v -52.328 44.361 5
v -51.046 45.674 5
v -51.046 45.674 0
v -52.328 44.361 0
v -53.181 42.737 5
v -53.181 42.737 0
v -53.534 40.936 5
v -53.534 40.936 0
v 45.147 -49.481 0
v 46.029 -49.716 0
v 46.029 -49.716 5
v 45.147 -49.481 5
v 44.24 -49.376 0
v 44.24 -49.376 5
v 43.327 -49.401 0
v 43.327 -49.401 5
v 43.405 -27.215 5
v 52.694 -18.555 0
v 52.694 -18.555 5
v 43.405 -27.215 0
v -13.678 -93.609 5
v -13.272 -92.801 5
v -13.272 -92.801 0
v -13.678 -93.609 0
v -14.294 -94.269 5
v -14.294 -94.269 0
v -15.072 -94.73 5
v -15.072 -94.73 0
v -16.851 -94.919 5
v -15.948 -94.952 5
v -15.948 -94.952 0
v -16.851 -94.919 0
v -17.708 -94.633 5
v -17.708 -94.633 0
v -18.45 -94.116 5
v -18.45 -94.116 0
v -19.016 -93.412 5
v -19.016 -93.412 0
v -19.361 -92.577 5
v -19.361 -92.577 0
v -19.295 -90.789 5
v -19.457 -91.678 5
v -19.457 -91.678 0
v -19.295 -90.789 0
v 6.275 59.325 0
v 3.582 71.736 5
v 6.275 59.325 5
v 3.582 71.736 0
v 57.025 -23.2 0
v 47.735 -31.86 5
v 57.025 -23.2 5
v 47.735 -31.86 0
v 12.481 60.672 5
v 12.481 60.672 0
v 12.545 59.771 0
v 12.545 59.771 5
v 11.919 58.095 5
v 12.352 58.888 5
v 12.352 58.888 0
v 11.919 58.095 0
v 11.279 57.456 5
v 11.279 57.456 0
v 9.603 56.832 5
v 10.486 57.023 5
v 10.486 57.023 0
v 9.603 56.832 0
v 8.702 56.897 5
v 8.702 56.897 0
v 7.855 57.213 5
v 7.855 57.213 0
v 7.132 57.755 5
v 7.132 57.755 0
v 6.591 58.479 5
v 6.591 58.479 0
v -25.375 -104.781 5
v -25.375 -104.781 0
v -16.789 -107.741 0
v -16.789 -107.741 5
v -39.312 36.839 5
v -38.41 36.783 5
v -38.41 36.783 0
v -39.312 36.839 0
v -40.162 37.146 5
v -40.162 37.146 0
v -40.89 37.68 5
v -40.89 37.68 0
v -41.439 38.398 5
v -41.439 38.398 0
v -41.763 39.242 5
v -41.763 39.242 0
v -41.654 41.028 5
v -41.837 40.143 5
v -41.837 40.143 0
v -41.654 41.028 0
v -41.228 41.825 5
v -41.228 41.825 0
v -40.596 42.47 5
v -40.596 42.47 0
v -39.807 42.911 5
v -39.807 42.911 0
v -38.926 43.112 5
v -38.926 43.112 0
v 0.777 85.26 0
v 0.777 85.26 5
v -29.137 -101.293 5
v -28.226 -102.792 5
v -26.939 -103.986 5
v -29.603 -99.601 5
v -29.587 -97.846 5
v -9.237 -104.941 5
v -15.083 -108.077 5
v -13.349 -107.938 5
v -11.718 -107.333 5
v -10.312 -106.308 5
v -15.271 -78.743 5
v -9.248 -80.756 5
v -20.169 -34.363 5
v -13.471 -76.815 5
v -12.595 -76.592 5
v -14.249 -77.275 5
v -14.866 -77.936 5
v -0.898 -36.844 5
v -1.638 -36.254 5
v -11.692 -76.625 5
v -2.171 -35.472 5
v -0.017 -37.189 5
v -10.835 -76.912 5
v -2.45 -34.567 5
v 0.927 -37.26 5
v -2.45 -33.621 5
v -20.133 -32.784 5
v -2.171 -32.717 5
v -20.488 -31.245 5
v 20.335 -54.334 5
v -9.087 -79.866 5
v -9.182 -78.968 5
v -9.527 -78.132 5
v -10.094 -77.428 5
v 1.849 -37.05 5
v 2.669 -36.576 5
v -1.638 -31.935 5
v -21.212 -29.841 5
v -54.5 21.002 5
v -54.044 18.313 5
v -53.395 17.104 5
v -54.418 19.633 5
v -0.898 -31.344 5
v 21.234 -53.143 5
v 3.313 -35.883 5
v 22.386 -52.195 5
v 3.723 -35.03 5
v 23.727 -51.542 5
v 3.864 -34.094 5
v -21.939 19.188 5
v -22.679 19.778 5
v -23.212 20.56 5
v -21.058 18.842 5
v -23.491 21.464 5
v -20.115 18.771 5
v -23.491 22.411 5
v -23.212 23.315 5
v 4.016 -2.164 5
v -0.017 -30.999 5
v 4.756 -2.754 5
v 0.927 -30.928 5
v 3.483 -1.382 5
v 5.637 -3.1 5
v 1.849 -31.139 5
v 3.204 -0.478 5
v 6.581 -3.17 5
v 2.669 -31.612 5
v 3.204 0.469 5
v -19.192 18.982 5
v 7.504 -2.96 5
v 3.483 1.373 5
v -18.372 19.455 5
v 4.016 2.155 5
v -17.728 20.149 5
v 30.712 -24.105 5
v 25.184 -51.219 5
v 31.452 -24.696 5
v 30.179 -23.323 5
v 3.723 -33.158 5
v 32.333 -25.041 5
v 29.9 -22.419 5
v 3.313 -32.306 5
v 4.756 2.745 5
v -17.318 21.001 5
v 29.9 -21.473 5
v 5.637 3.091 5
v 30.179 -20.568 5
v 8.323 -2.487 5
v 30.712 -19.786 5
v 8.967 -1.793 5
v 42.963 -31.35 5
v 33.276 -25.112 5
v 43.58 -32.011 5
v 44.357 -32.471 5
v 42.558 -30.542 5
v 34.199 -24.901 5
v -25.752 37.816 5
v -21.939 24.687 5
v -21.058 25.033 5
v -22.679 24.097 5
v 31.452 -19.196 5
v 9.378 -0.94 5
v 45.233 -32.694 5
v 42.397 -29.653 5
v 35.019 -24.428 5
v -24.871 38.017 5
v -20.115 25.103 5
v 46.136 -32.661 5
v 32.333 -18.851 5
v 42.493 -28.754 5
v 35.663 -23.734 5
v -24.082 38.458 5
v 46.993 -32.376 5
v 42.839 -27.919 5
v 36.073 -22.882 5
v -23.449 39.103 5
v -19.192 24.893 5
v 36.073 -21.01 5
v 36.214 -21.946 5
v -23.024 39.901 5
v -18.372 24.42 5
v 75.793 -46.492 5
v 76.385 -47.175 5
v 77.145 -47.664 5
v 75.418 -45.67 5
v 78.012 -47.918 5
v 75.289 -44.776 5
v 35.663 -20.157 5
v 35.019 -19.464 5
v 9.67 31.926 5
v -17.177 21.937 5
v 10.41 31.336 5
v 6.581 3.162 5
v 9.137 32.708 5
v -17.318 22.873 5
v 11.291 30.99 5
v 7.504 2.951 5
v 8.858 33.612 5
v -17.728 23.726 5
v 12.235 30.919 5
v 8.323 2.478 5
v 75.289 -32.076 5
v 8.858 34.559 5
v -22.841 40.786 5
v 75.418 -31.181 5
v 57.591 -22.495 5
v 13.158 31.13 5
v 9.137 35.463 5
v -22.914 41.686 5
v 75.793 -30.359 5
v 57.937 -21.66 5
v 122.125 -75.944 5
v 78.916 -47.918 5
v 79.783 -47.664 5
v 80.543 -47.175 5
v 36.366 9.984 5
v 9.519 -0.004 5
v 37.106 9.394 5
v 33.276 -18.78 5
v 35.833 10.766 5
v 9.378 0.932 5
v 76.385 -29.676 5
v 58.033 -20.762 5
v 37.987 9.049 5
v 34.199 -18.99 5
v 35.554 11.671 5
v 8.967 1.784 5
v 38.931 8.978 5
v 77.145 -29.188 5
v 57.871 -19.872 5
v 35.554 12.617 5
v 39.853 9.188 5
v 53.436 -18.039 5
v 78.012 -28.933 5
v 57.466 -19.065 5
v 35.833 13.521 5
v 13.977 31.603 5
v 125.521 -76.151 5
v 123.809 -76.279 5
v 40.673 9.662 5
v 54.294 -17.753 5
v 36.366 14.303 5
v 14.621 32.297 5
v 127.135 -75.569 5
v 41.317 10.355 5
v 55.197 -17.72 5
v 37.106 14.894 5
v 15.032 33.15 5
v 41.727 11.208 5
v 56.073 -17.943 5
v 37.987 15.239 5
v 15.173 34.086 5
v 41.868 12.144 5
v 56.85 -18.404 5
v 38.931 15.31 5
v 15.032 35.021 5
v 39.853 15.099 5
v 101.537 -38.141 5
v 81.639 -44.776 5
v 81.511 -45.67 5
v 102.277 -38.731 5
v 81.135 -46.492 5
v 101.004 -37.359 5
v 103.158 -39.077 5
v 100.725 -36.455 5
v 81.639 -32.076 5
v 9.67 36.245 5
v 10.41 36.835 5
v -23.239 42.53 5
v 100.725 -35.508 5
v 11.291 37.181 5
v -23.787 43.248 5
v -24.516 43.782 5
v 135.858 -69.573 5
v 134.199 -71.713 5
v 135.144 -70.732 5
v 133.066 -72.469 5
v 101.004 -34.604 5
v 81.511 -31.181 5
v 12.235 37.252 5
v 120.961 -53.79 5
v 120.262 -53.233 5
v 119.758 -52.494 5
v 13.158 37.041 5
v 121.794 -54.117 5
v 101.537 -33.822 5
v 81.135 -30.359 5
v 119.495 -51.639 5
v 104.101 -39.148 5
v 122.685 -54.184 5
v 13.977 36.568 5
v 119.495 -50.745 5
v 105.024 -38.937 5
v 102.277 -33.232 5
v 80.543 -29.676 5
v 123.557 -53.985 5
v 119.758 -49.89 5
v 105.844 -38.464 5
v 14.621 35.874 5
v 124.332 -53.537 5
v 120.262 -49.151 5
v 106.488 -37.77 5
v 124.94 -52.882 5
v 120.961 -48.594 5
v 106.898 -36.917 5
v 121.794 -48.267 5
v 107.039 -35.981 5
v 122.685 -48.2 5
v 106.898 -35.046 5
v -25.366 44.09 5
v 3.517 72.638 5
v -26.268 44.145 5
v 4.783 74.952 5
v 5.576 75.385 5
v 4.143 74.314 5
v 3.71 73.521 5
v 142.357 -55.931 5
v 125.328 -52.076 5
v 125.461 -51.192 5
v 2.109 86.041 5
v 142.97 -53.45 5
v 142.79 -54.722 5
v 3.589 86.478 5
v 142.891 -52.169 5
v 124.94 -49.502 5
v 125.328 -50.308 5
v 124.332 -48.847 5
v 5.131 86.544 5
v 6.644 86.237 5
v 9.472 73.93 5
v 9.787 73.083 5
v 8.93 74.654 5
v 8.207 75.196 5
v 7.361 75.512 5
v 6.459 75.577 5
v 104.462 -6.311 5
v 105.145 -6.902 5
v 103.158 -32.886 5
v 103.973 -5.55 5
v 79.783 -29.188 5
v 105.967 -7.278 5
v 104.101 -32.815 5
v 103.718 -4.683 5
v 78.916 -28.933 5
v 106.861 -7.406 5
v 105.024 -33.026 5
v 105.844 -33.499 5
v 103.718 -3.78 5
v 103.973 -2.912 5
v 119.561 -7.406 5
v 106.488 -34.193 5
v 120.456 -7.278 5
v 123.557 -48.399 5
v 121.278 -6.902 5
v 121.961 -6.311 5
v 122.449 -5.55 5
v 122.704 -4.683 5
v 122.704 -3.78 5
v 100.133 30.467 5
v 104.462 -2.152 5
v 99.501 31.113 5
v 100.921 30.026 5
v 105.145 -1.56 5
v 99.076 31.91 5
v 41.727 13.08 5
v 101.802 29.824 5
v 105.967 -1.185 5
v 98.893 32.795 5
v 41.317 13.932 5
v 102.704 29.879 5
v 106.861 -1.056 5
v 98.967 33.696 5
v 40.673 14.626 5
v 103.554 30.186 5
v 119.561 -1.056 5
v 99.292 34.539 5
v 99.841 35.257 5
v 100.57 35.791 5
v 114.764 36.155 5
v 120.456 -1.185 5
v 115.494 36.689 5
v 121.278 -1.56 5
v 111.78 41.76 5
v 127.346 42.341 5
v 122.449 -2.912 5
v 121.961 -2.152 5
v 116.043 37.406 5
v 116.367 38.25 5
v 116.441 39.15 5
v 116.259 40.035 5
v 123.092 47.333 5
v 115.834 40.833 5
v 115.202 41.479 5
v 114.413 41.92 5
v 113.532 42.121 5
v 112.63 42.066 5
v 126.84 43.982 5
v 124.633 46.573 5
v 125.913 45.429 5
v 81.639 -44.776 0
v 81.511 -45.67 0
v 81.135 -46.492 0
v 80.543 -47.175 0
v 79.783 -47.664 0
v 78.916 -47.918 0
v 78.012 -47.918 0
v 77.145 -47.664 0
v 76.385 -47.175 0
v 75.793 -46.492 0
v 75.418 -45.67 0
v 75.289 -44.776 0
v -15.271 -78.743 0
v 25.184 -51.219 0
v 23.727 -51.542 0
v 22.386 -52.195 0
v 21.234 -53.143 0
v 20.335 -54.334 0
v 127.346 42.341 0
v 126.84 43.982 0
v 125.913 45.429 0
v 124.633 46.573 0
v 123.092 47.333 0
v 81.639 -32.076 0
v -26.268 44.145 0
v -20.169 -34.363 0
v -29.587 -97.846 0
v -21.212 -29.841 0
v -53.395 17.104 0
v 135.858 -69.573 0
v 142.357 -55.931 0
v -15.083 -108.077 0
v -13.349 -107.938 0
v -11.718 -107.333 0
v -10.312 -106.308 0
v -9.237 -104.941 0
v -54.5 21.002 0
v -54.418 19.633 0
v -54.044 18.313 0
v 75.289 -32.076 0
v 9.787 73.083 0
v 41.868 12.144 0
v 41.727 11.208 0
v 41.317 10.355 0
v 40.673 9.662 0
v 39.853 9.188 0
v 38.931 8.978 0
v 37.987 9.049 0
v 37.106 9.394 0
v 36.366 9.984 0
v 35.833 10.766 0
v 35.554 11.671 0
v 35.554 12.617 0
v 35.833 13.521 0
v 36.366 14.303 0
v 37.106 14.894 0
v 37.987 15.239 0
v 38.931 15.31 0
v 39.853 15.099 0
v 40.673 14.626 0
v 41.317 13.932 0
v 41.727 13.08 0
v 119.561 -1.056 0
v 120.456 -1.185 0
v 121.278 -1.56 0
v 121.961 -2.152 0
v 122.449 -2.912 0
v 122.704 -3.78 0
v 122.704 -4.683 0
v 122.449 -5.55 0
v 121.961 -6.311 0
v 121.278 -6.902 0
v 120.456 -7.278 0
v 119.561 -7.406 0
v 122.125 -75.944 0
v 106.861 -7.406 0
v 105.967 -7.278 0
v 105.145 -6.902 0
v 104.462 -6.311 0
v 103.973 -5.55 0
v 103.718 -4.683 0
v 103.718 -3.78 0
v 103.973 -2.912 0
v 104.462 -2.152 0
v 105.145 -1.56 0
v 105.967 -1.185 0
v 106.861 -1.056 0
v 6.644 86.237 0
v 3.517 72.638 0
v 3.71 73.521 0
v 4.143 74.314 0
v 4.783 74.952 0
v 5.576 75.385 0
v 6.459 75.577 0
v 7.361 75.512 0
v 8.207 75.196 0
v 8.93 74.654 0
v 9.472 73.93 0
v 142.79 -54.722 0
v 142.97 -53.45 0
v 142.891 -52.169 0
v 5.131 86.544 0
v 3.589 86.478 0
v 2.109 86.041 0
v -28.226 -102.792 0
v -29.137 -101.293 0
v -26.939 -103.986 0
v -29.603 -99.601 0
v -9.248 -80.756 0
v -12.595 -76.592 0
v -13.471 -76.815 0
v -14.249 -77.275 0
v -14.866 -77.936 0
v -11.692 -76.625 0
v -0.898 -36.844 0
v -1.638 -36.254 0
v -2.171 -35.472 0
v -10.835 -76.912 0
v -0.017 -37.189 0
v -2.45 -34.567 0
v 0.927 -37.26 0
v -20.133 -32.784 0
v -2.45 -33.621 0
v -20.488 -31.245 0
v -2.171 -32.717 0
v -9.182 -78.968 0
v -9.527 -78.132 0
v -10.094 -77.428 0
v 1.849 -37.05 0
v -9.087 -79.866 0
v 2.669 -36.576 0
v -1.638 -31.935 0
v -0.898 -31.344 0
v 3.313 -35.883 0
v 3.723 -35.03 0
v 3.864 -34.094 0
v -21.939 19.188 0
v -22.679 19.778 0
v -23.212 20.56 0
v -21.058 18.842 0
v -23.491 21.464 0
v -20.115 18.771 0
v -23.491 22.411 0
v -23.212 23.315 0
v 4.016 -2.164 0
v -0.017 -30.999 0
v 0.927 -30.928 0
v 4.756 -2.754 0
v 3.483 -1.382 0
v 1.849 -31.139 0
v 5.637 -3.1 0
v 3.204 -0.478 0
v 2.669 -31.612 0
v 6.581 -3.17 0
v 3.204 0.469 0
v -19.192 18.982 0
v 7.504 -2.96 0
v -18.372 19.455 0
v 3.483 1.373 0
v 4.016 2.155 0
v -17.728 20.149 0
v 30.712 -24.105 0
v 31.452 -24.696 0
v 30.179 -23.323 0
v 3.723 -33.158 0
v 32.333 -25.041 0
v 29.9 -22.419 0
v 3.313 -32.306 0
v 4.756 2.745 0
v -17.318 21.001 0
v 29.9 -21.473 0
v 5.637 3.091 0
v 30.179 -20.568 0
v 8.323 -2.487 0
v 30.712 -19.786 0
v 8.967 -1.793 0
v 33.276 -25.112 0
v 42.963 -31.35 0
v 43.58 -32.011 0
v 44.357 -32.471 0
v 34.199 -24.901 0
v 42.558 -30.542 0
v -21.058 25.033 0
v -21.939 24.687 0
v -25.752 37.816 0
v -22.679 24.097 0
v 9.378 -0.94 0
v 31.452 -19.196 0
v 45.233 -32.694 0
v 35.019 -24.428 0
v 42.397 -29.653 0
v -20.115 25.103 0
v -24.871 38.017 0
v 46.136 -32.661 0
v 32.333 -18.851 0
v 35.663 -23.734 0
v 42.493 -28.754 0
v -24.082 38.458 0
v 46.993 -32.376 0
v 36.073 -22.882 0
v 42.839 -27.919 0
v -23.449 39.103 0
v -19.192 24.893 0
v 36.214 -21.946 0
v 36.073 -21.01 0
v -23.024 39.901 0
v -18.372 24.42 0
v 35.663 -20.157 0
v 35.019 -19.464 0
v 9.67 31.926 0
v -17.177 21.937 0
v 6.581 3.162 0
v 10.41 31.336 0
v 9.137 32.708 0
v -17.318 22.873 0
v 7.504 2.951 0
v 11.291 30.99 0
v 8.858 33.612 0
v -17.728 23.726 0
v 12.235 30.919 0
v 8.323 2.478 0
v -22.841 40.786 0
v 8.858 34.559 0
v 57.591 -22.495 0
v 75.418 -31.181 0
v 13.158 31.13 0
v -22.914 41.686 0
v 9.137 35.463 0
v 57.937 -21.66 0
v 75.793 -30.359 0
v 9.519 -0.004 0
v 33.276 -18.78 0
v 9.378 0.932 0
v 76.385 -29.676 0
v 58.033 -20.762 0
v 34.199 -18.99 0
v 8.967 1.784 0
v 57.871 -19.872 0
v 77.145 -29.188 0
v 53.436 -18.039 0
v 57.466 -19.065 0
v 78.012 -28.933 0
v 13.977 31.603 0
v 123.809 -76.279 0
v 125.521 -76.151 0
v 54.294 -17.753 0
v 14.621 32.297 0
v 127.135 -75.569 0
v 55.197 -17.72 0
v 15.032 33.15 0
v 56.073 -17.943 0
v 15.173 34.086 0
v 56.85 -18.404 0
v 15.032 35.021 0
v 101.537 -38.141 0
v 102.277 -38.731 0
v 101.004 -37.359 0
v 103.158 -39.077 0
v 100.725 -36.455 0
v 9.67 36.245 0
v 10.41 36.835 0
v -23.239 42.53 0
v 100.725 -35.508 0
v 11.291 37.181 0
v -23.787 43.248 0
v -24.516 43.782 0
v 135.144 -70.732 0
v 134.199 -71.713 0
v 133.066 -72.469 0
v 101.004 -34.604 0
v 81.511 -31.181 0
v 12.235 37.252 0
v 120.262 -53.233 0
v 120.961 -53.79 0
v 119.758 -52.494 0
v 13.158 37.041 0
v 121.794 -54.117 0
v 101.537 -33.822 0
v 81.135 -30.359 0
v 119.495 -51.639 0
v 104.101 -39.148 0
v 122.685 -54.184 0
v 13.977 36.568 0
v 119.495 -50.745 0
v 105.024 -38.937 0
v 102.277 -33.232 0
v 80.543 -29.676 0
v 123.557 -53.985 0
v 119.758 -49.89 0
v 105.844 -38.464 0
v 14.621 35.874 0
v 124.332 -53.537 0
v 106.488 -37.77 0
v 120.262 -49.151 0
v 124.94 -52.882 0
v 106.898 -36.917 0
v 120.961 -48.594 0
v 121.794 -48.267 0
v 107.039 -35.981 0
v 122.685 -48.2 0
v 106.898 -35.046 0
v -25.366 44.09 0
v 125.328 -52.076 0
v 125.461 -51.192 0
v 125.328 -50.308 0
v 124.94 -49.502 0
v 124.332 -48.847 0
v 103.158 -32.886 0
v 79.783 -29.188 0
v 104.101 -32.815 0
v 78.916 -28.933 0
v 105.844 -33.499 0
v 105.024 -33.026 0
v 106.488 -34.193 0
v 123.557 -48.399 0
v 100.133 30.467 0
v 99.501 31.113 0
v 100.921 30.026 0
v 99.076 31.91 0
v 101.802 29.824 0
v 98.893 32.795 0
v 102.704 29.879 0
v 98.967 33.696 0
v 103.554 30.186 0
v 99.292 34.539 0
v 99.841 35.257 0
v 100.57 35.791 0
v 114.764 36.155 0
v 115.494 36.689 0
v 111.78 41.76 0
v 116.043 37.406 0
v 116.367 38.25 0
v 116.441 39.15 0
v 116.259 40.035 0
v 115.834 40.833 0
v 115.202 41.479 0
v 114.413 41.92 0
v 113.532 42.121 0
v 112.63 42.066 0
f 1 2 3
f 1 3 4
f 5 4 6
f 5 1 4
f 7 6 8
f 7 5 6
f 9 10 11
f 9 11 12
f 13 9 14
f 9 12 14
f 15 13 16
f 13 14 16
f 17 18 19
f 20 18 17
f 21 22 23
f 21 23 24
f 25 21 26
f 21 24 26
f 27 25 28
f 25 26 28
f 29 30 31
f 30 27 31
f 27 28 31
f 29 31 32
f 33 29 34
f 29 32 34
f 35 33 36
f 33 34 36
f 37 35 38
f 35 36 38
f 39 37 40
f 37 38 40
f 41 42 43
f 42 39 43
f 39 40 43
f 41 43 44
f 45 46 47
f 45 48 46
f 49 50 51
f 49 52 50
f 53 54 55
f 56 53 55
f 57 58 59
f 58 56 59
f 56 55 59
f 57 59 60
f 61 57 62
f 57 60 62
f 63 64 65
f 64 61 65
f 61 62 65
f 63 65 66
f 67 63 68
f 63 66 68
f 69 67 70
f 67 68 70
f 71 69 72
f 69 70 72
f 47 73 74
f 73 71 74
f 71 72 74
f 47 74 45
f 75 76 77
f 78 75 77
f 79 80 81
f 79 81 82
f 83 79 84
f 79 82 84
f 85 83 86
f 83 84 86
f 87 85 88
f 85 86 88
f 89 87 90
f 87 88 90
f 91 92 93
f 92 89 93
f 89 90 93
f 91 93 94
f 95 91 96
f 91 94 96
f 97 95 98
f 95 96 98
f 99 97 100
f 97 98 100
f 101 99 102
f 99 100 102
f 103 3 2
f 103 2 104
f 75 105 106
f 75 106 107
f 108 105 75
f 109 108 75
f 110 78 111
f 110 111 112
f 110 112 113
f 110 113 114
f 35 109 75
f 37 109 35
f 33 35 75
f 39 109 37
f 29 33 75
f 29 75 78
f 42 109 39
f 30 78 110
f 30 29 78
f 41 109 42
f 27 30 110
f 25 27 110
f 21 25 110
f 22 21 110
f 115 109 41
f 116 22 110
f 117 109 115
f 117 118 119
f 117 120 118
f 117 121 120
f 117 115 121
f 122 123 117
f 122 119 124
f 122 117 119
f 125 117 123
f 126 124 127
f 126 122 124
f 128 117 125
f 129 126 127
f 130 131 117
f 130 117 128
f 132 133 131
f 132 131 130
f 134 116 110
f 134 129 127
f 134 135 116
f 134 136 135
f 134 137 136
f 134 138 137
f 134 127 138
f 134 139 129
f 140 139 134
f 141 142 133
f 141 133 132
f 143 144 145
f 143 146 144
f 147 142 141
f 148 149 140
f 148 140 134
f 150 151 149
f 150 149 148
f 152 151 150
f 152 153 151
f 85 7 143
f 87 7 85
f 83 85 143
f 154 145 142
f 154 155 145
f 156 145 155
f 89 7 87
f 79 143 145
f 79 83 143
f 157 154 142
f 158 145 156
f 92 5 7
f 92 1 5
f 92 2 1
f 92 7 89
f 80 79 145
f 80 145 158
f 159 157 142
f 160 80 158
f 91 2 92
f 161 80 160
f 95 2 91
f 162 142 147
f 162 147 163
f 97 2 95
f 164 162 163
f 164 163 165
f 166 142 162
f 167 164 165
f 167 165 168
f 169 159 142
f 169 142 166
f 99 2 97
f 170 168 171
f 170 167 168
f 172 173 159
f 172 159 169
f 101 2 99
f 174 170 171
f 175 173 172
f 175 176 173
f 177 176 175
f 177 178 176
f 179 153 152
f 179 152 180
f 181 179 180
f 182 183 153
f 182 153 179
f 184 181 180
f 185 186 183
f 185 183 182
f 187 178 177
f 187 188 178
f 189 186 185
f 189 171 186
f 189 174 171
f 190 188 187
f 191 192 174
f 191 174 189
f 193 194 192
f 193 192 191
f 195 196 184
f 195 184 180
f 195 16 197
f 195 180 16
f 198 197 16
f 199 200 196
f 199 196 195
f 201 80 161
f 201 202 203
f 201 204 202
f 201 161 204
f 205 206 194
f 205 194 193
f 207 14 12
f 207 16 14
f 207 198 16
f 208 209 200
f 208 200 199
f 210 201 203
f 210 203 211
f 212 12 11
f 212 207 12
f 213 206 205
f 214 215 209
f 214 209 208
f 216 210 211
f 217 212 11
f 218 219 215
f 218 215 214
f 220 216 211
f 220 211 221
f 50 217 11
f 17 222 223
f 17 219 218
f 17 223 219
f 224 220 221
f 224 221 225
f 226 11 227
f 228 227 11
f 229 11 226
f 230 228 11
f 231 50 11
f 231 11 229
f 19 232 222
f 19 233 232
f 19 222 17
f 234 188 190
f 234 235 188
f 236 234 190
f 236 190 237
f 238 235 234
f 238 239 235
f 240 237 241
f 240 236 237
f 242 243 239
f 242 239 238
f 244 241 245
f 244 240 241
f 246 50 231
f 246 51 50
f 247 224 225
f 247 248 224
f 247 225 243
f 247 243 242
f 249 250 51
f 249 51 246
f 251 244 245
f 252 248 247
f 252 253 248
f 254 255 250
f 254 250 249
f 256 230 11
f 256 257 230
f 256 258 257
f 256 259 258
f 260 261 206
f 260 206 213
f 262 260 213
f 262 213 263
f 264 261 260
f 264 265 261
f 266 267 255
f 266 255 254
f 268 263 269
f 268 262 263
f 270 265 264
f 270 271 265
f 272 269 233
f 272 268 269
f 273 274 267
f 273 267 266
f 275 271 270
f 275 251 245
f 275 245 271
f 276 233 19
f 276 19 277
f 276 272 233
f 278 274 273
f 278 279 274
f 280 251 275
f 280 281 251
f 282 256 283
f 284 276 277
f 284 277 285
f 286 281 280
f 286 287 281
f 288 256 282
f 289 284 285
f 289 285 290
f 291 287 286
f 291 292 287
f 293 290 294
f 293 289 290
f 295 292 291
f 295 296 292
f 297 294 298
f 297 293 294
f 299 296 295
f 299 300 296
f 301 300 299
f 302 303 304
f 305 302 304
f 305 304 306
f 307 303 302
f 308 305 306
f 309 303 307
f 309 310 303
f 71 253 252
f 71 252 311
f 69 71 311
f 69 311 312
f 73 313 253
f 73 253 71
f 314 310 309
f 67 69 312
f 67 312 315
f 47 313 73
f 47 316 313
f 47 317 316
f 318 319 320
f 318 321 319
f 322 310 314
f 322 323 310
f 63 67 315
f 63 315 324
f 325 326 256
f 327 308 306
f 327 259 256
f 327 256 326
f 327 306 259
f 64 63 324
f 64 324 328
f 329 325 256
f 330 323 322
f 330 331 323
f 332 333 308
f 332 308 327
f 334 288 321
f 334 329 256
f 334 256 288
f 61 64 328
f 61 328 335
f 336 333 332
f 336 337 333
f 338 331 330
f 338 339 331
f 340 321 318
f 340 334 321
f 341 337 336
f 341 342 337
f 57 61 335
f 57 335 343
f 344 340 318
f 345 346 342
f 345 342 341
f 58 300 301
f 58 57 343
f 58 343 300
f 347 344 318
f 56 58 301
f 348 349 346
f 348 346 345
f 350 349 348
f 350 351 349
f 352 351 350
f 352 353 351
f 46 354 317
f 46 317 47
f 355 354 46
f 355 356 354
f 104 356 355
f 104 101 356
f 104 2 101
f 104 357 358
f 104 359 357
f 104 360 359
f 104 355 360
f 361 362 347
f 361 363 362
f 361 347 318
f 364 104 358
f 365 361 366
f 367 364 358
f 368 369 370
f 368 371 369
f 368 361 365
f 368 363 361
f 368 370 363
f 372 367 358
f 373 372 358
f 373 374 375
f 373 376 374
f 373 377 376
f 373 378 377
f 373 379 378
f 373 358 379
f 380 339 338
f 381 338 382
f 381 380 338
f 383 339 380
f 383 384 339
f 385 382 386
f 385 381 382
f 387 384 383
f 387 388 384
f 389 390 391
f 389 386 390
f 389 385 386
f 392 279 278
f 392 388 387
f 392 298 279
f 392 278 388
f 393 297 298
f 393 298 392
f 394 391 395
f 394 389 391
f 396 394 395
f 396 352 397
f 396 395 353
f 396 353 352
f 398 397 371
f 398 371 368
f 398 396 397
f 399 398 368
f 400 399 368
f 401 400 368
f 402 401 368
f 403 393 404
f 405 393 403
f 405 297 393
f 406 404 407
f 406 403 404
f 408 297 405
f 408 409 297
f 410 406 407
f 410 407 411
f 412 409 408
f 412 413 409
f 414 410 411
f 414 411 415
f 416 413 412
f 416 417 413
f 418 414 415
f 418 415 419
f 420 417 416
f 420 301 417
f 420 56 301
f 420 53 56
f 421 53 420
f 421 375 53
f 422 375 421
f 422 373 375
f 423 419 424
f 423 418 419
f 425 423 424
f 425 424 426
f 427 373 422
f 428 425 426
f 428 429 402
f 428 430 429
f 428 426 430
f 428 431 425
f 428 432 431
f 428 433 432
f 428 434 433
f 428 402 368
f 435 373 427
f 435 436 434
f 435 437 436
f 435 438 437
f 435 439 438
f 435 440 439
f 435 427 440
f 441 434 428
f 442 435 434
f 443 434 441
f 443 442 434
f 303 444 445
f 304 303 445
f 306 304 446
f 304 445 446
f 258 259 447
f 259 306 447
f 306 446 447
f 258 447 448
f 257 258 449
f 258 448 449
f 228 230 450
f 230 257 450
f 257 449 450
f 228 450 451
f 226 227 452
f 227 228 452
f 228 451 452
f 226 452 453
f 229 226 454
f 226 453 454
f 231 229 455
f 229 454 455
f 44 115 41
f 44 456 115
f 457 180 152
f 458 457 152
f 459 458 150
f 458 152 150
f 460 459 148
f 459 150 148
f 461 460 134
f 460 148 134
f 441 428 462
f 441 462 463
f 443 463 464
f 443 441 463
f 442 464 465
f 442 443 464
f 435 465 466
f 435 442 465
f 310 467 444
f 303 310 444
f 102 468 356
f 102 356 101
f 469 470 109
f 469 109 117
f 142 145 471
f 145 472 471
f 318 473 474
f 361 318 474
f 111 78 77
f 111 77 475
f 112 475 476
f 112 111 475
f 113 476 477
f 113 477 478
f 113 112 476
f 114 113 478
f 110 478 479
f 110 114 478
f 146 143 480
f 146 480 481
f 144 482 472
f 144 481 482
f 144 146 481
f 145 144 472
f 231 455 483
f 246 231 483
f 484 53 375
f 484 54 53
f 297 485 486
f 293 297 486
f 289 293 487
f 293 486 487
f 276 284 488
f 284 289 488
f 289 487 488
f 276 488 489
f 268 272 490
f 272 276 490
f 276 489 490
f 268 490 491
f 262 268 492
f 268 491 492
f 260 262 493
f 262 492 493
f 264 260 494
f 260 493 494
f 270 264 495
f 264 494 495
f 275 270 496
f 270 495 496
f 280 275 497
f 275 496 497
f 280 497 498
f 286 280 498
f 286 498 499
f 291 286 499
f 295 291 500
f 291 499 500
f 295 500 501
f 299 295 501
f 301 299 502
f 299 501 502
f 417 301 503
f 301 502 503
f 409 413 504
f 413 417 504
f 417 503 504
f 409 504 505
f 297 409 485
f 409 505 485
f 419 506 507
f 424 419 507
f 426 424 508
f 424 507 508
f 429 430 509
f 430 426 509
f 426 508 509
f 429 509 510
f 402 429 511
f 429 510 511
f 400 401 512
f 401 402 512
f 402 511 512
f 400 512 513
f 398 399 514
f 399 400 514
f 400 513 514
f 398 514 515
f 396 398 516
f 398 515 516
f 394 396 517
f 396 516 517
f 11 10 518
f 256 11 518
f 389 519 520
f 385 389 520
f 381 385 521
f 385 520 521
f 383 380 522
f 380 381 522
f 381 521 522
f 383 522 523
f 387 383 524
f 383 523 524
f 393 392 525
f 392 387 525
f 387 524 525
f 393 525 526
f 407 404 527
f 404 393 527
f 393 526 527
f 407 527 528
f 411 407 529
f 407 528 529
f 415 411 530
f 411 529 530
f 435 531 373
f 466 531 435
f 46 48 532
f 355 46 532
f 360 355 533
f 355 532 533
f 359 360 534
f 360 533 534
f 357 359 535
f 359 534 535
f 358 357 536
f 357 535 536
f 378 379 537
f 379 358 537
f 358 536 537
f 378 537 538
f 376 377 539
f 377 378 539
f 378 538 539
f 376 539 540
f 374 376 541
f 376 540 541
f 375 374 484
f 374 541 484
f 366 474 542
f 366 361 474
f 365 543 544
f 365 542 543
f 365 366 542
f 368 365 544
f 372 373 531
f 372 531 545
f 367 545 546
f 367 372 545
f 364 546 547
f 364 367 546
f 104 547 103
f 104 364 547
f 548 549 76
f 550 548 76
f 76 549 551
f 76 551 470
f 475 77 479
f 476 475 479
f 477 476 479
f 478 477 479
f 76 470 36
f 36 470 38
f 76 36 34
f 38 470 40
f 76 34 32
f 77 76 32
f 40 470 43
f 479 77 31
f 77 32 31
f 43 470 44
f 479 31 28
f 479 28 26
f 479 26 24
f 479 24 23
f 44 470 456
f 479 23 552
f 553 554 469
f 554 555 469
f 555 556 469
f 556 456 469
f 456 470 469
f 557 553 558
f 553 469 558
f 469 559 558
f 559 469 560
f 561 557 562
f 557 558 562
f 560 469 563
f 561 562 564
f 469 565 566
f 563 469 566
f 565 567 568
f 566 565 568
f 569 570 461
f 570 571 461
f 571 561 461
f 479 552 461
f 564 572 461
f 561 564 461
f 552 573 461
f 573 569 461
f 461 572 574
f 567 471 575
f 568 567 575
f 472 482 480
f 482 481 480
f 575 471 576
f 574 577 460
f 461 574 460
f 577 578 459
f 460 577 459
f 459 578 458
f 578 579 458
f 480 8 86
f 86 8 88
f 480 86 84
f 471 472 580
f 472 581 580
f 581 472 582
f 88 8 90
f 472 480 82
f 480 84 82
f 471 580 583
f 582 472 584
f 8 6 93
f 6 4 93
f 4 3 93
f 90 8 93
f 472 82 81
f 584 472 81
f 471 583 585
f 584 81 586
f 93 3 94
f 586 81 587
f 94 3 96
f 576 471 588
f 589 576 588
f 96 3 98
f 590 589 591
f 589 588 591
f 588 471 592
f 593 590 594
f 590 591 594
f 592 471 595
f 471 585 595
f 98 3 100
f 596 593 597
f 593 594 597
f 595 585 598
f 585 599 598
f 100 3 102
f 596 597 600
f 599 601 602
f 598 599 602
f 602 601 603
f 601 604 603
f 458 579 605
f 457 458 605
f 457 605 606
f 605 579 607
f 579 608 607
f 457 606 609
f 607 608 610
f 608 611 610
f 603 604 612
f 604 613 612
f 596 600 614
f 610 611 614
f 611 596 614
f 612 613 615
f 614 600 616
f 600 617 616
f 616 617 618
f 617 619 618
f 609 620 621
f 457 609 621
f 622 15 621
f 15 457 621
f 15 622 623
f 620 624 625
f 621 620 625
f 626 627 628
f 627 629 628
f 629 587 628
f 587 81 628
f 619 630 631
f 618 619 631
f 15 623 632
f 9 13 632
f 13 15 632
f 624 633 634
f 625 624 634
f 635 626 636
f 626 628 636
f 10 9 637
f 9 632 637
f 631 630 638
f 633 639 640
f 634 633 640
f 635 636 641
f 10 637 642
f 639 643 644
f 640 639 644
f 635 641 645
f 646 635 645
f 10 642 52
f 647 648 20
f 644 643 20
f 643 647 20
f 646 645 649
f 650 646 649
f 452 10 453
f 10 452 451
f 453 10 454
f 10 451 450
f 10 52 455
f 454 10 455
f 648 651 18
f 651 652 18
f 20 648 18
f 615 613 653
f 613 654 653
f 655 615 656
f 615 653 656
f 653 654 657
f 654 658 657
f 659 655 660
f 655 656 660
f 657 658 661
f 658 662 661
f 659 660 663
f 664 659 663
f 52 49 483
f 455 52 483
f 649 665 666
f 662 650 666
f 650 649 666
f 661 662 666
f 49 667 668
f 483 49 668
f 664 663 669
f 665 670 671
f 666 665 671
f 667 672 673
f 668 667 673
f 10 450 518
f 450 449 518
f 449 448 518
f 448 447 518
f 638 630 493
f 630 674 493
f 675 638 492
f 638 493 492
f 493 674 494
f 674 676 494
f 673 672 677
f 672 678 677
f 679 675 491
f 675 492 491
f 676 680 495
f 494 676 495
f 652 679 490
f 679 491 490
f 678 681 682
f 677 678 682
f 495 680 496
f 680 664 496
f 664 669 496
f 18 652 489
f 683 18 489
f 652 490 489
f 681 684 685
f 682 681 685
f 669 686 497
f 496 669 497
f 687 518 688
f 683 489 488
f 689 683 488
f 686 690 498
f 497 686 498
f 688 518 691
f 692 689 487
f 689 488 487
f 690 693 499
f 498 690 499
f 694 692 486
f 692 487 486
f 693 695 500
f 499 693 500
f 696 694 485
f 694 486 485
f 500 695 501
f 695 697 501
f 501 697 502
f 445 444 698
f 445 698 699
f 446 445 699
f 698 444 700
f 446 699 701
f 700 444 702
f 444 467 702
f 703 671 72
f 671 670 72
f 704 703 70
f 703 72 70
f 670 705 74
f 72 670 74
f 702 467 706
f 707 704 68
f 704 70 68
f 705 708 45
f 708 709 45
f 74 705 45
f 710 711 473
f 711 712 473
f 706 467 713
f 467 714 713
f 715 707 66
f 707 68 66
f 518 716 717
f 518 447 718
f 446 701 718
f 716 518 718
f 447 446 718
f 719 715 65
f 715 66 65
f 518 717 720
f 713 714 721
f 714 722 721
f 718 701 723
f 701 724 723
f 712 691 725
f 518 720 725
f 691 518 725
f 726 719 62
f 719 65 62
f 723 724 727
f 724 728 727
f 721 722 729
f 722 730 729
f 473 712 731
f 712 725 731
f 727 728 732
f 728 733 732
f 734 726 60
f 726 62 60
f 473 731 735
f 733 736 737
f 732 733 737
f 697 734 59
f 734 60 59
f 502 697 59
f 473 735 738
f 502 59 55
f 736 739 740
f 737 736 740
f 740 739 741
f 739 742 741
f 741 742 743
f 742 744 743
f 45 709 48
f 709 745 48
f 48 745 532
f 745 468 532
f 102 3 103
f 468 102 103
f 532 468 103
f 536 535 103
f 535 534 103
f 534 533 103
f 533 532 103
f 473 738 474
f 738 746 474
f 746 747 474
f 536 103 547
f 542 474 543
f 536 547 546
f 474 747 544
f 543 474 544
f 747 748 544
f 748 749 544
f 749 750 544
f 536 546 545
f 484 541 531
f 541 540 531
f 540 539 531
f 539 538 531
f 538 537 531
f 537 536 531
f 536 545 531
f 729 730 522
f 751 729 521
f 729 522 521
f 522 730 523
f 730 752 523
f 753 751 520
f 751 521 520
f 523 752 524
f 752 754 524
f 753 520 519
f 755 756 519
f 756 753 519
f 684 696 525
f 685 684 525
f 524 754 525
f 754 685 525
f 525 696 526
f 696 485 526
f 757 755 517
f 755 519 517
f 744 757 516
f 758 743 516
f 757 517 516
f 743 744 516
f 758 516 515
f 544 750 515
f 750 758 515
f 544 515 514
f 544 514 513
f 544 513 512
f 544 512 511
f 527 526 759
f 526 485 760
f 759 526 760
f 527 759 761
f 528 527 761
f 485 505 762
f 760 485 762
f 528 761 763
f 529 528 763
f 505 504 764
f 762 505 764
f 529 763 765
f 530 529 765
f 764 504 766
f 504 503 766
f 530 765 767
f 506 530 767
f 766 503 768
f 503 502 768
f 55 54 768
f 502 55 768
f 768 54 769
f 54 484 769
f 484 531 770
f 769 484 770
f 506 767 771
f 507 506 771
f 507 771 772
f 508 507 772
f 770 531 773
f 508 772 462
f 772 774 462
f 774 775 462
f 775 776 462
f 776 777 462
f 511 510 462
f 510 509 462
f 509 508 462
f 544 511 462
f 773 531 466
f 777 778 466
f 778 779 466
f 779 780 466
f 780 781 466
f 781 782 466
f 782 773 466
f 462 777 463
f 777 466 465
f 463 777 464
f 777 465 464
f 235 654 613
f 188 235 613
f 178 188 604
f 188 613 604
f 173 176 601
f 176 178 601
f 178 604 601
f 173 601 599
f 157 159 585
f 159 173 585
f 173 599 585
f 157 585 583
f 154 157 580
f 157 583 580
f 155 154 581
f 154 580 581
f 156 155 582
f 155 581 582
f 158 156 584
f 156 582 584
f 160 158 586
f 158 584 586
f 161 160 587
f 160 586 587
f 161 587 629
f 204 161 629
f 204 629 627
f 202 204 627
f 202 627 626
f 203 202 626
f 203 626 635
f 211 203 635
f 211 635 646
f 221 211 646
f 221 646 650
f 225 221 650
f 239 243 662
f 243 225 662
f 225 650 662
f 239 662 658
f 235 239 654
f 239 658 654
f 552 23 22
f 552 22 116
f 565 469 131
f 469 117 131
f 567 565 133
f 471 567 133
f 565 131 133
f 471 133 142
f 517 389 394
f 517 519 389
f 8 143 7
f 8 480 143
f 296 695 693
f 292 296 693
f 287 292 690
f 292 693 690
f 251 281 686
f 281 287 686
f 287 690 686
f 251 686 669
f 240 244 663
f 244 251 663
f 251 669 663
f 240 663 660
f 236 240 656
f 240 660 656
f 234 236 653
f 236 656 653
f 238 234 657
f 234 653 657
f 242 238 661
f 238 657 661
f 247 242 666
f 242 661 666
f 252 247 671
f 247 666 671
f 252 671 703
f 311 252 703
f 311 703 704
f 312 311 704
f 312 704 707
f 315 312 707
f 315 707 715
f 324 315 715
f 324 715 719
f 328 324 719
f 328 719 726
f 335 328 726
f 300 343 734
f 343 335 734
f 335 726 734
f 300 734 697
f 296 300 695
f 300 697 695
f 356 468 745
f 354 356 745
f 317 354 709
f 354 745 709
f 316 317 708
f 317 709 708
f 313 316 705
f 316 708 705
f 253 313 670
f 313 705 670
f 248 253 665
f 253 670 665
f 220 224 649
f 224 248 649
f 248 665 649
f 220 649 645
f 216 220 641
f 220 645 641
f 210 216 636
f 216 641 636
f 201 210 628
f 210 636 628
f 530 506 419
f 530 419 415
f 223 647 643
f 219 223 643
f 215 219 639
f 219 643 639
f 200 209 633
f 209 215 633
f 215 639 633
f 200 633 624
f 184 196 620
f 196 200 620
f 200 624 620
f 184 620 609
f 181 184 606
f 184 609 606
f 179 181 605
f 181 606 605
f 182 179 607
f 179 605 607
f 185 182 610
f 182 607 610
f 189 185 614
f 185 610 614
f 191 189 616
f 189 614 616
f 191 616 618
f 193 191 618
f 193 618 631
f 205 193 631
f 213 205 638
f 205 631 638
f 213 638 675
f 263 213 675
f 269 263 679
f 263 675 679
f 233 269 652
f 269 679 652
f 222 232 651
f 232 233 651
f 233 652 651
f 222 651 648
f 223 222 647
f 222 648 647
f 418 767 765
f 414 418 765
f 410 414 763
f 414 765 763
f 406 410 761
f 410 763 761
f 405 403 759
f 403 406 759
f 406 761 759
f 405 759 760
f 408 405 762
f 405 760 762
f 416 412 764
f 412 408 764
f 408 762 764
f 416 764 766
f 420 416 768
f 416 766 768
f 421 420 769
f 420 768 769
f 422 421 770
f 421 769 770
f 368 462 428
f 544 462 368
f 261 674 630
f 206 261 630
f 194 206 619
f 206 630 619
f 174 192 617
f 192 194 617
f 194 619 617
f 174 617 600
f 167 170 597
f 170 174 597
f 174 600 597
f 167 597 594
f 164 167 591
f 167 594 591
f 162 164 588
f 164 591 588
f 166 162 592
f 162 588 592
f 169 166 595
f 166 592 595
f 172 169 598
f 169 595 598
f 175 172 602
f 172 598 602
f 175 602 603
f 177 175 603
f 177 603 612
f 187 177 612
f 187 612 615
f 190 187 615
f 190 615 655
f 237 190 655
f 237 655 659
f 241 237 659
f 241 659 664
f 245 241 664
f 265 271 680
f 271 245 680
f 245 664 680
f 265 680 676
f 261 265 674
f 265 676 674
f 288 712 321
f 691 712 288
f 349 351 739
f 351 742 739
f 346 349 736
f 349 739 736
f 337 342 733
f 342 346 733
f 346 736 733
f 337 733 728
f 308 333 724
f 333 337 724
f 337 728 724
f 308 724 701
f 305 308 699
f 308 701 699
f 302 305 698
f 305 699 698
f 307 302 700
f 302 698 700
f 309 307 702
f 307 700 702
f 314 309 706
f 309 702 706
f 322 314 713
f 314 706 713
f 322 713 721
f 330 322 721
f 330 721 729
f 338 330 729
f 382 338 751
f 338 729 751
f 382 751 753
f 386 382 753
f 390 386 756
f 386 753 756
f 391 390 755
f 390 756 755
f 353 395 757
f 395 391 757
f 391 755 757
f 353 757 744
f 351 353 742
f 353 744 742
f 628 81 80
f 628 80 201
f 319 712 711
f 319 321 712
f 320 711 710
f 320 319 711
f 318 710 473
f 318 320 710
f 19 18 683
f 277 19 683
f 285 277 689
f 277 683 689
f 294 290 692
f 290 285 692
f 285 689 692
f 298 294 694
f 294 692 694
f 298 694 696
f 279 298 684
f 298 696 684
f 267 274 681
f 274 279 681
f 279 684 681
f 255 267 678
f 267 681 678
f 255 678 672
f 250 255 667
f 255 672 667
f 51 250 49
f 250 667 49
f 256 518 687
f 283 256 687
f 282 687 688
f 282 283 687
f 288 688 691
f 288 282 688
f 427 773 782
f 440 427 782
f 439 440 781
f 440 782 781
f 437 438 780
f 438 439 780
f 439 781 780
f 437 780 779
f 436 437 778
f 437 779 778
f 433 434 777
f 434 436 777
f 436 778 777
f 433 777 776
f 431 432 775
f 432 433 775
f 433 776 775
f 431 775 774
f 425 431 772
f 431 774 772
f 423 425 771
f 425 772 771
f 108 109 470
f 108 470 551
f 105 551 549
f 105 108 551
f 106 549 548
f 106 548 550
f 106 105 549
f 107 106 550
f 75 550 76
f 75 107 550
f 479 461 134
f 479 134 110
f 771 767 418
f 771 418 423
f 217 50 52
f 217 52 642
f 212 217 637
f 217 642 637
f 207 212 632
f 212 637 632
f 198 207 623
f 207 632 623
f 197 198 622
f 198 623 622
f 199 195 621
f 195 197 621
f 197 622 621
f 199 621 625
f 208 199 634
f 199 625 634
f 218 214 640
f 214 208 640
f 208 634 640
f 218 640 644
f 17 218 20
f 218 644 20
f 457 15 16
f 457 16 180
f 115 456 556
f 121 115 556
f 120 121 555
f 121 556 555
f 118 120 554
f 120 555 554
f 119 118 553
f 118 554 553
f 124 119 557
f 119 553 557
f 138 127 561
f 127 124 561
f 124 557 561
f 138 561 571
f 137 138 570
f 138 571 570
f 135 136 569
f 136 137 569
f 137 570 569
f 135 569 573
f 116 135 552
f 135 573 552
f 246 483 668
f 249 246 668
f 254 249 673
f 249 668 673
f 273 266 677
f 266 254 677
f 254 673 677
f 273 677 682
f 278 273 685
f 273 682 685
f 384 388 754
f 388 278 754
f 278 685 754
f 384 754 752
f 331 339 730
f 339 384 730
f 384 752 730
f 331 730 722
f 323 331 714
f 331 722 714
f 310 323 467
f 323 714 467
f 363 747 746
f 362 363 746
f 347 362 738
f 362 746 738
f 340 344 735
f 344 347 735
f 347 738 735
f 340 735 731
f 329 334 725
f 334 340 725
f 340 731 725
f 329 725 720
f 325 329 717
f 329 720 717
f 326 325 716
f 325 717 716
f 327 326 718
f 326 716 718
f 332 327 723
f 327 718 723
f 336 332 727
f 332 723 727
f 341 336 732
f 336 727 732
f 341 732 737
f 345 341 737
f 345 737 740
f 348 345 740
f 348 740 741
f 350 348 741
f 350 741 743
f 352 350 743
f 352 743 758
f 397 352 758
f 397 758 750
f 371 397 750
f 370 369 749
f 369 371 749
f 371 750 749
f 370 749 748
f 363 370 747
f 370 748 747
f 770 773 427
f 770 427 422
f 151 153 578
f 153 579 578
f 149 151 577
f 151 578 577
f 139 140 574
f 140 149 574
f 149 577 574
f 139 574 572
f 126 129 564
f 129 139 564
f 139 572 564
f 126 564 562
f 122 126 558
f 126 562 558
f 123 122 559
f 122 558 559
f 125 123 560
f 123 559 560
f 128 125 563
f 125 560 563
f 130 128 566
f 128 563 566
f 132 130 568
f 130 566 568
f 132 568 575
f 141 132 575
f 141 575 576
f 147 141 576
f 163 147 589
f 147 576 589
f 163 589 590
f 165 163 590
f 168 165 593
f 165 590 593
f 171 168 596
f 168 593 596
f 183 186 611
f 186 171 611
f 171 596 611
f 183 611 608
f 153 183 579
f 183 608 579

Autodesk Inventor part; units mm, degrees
ref_plane "YZ Plane" through (0, 0, 0) normal (1, 0, 0) x (0, 1, 0)
ref_plane "XZ Plane" through (0, 0, 0) normal (0, 1, 0) x (-1, 0, 0)
ref_plane "XY Plane" through (0, 0, 0) normal (0, 0, 1) x (1, 0, 0)
sketch "Base" plane through (0, 0, 0) normal (0, 0, 1) x (1, 0, 0)
  circle A0 centre (6.3437, -0.0043) radius 44.7044
  line L0 (-53.391, 43.8831) -> (3.4518, 87.3031)
  line L1 (3.4518, 87.3031) -> (126.7242, 46.1195)
  line L2 (21.9665, -51.542) -> (-11.8651, -109.4379)
  line L3 (134.9457, -71.4872) -> (143.2137, -54.1334)
  line L4 (44.7126, -49.2622) -> (124.7112, -76.8356)
  line L5 (44.7126, -49.2622) -> (21.9665, -51.542)
  line L6 (126.7242, 46.1195) -> (143.2137, -54.1334)
  line L7 (134.9457, -71.4872) -> (124.7112, -76.8356)
  line L8 (-30.3614, -103.0627) -> (-11.8651, -109.4379)
  line L9 (-30.3614, -103.0627) -> (-19.8027, -31.8971)
  line L10 (-54.6035, 18.8674) -> (-53.391, 43.8831)
  line L11 (-54.6035, 18.8674) -> (-19.8027, -31.8971)
  line L12 (-94.1669, 0) -> (182.7771, 0) construction
  circle A1 centre (6.3437, -0.0043) radius 3.175
  circle A2 centre (103.8642, -35.9814) radius 3.175
  line L13 (126.7242, 46.1195) -> (-19.8027, -31.8971) construction
  line L14 (3.4518, 87.3031) -> (33.3396, -50.4021) construction
  line L15 (-53.9972, 31.3753) -> (126.7242, 46.1195) construction
  line L16 (134.969, -4.007) -> (-37.2031, -6.5149) construction
  line L17 (-21.1132, -106.2503) -> (39.5241, 75.2519) construction
  line L18 (78.4642, -60.8955) -> (78.4642, 62.2425) construction
  line L19 (21.9665, -51.542) -> (126.7242, 46.1195) construction
  line L20 (0, 0) -> (-53.391, 43.8831) construction
  circle A3 centre (-20.3518, 21.9373) radius 3.175
  circle A4 centre (6.3437, -0.0043) radius 34.5555 construction
  circle A5 centre (-26.006, -12.1525) radius 3.175
  circle A6 centre (0.6895, -34.0941) radius 3.175
  circle A7 centre (33.0392, -21.9459) radius 3.175
  circle A8 centre (38.6934, 12.1439) radius 3.175
  circle A9 centre (11.9979, 34.0855) radius 3.175
  line L21 (113.2722, 38.9571) -> (102.0622, 32.9885) construction
  line L22 (111.78, 41.7596) -> (100.57, 35.791)
  line L23 (103.5543, 30.186) -> (114.7644, 36.1546)
  arc A10 (114.7644, 36.1546) -> (111.78, 41.7596) centre (113.2722, 38.9571) ccw
  arc A11 (100.57, 35.791) -> (103.5543, 30.186) centre (102.0622, 32.9885) ccw
  line L24 (119.5611, -4.2314) -> (106.8611, -4.2314) construction
  line L25 (119.5611, -1.0564) -> (106.8611, -1.0564)
  line L26 (106.8611, -7.4064) -> (119.5611, -7.4064)
  arc A12 (119.5611, -7.4064) -> (119.5611, -1.0564) centre (119.5611, -4.2314) ccw
  arc A13 (106.8611, -1.0564) -> (106.8611, -7.4064) centre (106.8611, -4.2314) ccw
  line L27 (6.6843, 72.4098) -> (9.378, 59.9988) construction
  line L28 (3.5815, 71.7364) -> (6.2752, 59.3254)
  line L29 (12.4807, 60.6722) -> (9.787, 73.0833)
  arc A14 (9.787, 73.0833) -> (3.5815, 71.7364) centre (6.6843, 72.4098) ccw
  arc A15 (6.2752, 59.3254) -> (12.4807, 60.6722) centre (9.378, 59.9988) ccw
  line L30 (-16.2839, -91.795) -> (-12.2597, -79.7494) construction
  line L31 (-13.2725, -92.801) -> (-9.2483, -80.7555)
  line L32 (-15.271, -78.7434) -> (-19.2953, -90.7889)
  arc A16 (-19.2953, -90.7889) -> (-13.2725, -92.801) centre (-16.2839, -91.795) ccw
  arc A17 (-9.2483, -80.7555) -> (-15.271, -78.7434) centre (-12.2597, -79.7494) ccw
  line L33 (78.4642, -44.7756) -> (78.4642, -32.0756) construction
  line L34 (75.2892, -44.7756) -> (75.2892, -32.0756)
  line L35 (81.6392, -32.0756) -> (81.6392, -44.7756)
  arc A18 (75.2892, -44.7756) -> (81.6392, -44.7756) centre (78.4642, -44.7756) ccw
  arc A19 (81.6392, -32.0756) -> (75.2892, -32.0756) centre (78.4642, -32.0756) ccw
  line L36 (-38.6678, 39.9478) -> (-26.0099, 40.9805) construction
  line L37 (-38.4097, 36.7833) -> (-25.7517, 37.816)
  line L38 (-26.2681, 44.145) -> (-38.926, 43.1123)
  arc A20 (-38.926, 43.1123) -> (-38.4097, 36.7833) centre (-38.6678, 39.9478) ccw
  arc A21 (-25.7517, 37.816) -> (-26.2681, 44.145) centre (-26.0099, 40.9805) ccw
  line L39 (45.5702, -29.5373) -> (54.8596, -20.8771) construction
  line L40 (47.7352, -31.8596) -> (57.0246, -23.1995)
  line L41 (52.6945, -18.5548) -> (43.4052, -27.2149)
  arc A22 (43.4052, -27.2149) -> (47.7352, -31.8596) centre (45.5702, -29.5373) ccw
  arc A23 (57.0246, -23.1995) -> (52.6945, -18.5548) centre (54.8596, -20.8771) ccw
  line L42 (-38.6678, 39.9478) -> (-53.391, 43.8831) construction
  circle A24 centre (122.4612, -51.192) radius 3
  point P0 (107.6672, 35.9728)
  point P1 (113.2111, -4.2314)
  point P2 (8.0311, 66.2043)
  point P3 (-14.2718, -85.7722)
  point P4 (78.4642, -38.4256)
  point P5 (-32.3389, 40.4642)
  point P6 (50.2149, -25.2072)
  dimension "d48" = 69.111
  dimension "d1" = 89.4088
  dimension "d2" = 55.568
  dimension "d3" = 37.094
  dimension "d4" = 120.3
  dimension "d5" = 81.561
  dimension "d6" = 160.982
  dimension "d7" = 133.392
  dimension "d8" = 143.066
  dimension "d9" = 145.185
  dimension "d10" = 124.151
  dimension "d11" = 130.15
  dimension "d12" = 142.793
  dimension "d13" = 117.814
  dimension "d14" = 19.5642
  dimension "d15" = 25.0158
  dimension "d16" = 71.529
  dimension "d17" = 61.5478
  dimension "d18" = 129.9699
  dimension "d19" = 101.6
  dimension "d20" = 19.2227
  dimension "d21" = 11.5477
  dimension "d22" = 84.6172
  dimension "d23" = 67.056
  dimension "d24" = 22.86
  dimension "d25" = 39.5986
  dimension "d26" = 71.1371
  dimension "d29" = 6.35
  dimension "d30" = 6.35
  dimension "d31" = 48.26
  dimension "d32" = 6.35
  dimension "d35" = 360
  dimension "d37" = 6.35
  dimension "d38" = 6.35
  dimension "d39" = 15.24
  dimension "d40" = 12.7
  dimension "d41" = 15.24
  dimension "d43" = 15.24
  dimension "d44" = 15.24
  dimension "d45" = 15.24
  dimension "d46" = 15.7016
  dimension "d49" = 140.583
  dimension "d50" = 4.2314
  dimension "d51" = 91.5631
  dimension "d52" = 12.1439
  dimension "d53" = 0
  dimension "d60" = 126.024
  dimension "d61" = 155.259
  dimension "d63" = 15.24
  dimension "d64" = 12.0647
  dimension "d67" = 25.4
  dimension "d68" = 31.75
  dimension "d69" = 6
  dimension "d70" = 20
  dimension "d71" = 20
extrude "Plate1" add sketch "Base" along normal blind 5 contours A0 L9 L11 | A0 L11 L10 L0 L1 L6 L3 L7 L4 L5 L2 L8 L9 | A5 picked at (-0.619, 18.5381)
fillet "OutsideFilletsFeature" radius 6.35 12 edges at (126.7242, 46.1195, 2.5) (3.4518, 87.3031, 2.5) (143.2137, -54.1334, 2.5) (134.9457, -71.4872, 2.5) (124.7112, -76.8356, 2.5) (-11.8651, -109.4379, 2.5) (44.7126, -49.2622, 2.5) (21.9665, -51.542, 2.5) (-30.3614, -103.0627, 2.5) (-19.8027, -31.8971, 2.5) (-54.6035, 18.8674, 2.5) (-53.391, 43.8831, 2.5)
sketch "HandleAttachment" plane through (0, 0, 0) normal (0, 0, -1) x (-1, 0, 0)
  circle A0 centre (-122.4612, -51.192) radius 3 projected
  point P0 (0, 0)
equation "\"d41\" = d39"
equation "\"d43\" = d39"
equation "\"d44\" = d43"
equation "\"d45\" = d43"
equation "\"d47\" = Thickness"
equation "\"Thickness\" = 5"
properties part number "UpperLeg2"
